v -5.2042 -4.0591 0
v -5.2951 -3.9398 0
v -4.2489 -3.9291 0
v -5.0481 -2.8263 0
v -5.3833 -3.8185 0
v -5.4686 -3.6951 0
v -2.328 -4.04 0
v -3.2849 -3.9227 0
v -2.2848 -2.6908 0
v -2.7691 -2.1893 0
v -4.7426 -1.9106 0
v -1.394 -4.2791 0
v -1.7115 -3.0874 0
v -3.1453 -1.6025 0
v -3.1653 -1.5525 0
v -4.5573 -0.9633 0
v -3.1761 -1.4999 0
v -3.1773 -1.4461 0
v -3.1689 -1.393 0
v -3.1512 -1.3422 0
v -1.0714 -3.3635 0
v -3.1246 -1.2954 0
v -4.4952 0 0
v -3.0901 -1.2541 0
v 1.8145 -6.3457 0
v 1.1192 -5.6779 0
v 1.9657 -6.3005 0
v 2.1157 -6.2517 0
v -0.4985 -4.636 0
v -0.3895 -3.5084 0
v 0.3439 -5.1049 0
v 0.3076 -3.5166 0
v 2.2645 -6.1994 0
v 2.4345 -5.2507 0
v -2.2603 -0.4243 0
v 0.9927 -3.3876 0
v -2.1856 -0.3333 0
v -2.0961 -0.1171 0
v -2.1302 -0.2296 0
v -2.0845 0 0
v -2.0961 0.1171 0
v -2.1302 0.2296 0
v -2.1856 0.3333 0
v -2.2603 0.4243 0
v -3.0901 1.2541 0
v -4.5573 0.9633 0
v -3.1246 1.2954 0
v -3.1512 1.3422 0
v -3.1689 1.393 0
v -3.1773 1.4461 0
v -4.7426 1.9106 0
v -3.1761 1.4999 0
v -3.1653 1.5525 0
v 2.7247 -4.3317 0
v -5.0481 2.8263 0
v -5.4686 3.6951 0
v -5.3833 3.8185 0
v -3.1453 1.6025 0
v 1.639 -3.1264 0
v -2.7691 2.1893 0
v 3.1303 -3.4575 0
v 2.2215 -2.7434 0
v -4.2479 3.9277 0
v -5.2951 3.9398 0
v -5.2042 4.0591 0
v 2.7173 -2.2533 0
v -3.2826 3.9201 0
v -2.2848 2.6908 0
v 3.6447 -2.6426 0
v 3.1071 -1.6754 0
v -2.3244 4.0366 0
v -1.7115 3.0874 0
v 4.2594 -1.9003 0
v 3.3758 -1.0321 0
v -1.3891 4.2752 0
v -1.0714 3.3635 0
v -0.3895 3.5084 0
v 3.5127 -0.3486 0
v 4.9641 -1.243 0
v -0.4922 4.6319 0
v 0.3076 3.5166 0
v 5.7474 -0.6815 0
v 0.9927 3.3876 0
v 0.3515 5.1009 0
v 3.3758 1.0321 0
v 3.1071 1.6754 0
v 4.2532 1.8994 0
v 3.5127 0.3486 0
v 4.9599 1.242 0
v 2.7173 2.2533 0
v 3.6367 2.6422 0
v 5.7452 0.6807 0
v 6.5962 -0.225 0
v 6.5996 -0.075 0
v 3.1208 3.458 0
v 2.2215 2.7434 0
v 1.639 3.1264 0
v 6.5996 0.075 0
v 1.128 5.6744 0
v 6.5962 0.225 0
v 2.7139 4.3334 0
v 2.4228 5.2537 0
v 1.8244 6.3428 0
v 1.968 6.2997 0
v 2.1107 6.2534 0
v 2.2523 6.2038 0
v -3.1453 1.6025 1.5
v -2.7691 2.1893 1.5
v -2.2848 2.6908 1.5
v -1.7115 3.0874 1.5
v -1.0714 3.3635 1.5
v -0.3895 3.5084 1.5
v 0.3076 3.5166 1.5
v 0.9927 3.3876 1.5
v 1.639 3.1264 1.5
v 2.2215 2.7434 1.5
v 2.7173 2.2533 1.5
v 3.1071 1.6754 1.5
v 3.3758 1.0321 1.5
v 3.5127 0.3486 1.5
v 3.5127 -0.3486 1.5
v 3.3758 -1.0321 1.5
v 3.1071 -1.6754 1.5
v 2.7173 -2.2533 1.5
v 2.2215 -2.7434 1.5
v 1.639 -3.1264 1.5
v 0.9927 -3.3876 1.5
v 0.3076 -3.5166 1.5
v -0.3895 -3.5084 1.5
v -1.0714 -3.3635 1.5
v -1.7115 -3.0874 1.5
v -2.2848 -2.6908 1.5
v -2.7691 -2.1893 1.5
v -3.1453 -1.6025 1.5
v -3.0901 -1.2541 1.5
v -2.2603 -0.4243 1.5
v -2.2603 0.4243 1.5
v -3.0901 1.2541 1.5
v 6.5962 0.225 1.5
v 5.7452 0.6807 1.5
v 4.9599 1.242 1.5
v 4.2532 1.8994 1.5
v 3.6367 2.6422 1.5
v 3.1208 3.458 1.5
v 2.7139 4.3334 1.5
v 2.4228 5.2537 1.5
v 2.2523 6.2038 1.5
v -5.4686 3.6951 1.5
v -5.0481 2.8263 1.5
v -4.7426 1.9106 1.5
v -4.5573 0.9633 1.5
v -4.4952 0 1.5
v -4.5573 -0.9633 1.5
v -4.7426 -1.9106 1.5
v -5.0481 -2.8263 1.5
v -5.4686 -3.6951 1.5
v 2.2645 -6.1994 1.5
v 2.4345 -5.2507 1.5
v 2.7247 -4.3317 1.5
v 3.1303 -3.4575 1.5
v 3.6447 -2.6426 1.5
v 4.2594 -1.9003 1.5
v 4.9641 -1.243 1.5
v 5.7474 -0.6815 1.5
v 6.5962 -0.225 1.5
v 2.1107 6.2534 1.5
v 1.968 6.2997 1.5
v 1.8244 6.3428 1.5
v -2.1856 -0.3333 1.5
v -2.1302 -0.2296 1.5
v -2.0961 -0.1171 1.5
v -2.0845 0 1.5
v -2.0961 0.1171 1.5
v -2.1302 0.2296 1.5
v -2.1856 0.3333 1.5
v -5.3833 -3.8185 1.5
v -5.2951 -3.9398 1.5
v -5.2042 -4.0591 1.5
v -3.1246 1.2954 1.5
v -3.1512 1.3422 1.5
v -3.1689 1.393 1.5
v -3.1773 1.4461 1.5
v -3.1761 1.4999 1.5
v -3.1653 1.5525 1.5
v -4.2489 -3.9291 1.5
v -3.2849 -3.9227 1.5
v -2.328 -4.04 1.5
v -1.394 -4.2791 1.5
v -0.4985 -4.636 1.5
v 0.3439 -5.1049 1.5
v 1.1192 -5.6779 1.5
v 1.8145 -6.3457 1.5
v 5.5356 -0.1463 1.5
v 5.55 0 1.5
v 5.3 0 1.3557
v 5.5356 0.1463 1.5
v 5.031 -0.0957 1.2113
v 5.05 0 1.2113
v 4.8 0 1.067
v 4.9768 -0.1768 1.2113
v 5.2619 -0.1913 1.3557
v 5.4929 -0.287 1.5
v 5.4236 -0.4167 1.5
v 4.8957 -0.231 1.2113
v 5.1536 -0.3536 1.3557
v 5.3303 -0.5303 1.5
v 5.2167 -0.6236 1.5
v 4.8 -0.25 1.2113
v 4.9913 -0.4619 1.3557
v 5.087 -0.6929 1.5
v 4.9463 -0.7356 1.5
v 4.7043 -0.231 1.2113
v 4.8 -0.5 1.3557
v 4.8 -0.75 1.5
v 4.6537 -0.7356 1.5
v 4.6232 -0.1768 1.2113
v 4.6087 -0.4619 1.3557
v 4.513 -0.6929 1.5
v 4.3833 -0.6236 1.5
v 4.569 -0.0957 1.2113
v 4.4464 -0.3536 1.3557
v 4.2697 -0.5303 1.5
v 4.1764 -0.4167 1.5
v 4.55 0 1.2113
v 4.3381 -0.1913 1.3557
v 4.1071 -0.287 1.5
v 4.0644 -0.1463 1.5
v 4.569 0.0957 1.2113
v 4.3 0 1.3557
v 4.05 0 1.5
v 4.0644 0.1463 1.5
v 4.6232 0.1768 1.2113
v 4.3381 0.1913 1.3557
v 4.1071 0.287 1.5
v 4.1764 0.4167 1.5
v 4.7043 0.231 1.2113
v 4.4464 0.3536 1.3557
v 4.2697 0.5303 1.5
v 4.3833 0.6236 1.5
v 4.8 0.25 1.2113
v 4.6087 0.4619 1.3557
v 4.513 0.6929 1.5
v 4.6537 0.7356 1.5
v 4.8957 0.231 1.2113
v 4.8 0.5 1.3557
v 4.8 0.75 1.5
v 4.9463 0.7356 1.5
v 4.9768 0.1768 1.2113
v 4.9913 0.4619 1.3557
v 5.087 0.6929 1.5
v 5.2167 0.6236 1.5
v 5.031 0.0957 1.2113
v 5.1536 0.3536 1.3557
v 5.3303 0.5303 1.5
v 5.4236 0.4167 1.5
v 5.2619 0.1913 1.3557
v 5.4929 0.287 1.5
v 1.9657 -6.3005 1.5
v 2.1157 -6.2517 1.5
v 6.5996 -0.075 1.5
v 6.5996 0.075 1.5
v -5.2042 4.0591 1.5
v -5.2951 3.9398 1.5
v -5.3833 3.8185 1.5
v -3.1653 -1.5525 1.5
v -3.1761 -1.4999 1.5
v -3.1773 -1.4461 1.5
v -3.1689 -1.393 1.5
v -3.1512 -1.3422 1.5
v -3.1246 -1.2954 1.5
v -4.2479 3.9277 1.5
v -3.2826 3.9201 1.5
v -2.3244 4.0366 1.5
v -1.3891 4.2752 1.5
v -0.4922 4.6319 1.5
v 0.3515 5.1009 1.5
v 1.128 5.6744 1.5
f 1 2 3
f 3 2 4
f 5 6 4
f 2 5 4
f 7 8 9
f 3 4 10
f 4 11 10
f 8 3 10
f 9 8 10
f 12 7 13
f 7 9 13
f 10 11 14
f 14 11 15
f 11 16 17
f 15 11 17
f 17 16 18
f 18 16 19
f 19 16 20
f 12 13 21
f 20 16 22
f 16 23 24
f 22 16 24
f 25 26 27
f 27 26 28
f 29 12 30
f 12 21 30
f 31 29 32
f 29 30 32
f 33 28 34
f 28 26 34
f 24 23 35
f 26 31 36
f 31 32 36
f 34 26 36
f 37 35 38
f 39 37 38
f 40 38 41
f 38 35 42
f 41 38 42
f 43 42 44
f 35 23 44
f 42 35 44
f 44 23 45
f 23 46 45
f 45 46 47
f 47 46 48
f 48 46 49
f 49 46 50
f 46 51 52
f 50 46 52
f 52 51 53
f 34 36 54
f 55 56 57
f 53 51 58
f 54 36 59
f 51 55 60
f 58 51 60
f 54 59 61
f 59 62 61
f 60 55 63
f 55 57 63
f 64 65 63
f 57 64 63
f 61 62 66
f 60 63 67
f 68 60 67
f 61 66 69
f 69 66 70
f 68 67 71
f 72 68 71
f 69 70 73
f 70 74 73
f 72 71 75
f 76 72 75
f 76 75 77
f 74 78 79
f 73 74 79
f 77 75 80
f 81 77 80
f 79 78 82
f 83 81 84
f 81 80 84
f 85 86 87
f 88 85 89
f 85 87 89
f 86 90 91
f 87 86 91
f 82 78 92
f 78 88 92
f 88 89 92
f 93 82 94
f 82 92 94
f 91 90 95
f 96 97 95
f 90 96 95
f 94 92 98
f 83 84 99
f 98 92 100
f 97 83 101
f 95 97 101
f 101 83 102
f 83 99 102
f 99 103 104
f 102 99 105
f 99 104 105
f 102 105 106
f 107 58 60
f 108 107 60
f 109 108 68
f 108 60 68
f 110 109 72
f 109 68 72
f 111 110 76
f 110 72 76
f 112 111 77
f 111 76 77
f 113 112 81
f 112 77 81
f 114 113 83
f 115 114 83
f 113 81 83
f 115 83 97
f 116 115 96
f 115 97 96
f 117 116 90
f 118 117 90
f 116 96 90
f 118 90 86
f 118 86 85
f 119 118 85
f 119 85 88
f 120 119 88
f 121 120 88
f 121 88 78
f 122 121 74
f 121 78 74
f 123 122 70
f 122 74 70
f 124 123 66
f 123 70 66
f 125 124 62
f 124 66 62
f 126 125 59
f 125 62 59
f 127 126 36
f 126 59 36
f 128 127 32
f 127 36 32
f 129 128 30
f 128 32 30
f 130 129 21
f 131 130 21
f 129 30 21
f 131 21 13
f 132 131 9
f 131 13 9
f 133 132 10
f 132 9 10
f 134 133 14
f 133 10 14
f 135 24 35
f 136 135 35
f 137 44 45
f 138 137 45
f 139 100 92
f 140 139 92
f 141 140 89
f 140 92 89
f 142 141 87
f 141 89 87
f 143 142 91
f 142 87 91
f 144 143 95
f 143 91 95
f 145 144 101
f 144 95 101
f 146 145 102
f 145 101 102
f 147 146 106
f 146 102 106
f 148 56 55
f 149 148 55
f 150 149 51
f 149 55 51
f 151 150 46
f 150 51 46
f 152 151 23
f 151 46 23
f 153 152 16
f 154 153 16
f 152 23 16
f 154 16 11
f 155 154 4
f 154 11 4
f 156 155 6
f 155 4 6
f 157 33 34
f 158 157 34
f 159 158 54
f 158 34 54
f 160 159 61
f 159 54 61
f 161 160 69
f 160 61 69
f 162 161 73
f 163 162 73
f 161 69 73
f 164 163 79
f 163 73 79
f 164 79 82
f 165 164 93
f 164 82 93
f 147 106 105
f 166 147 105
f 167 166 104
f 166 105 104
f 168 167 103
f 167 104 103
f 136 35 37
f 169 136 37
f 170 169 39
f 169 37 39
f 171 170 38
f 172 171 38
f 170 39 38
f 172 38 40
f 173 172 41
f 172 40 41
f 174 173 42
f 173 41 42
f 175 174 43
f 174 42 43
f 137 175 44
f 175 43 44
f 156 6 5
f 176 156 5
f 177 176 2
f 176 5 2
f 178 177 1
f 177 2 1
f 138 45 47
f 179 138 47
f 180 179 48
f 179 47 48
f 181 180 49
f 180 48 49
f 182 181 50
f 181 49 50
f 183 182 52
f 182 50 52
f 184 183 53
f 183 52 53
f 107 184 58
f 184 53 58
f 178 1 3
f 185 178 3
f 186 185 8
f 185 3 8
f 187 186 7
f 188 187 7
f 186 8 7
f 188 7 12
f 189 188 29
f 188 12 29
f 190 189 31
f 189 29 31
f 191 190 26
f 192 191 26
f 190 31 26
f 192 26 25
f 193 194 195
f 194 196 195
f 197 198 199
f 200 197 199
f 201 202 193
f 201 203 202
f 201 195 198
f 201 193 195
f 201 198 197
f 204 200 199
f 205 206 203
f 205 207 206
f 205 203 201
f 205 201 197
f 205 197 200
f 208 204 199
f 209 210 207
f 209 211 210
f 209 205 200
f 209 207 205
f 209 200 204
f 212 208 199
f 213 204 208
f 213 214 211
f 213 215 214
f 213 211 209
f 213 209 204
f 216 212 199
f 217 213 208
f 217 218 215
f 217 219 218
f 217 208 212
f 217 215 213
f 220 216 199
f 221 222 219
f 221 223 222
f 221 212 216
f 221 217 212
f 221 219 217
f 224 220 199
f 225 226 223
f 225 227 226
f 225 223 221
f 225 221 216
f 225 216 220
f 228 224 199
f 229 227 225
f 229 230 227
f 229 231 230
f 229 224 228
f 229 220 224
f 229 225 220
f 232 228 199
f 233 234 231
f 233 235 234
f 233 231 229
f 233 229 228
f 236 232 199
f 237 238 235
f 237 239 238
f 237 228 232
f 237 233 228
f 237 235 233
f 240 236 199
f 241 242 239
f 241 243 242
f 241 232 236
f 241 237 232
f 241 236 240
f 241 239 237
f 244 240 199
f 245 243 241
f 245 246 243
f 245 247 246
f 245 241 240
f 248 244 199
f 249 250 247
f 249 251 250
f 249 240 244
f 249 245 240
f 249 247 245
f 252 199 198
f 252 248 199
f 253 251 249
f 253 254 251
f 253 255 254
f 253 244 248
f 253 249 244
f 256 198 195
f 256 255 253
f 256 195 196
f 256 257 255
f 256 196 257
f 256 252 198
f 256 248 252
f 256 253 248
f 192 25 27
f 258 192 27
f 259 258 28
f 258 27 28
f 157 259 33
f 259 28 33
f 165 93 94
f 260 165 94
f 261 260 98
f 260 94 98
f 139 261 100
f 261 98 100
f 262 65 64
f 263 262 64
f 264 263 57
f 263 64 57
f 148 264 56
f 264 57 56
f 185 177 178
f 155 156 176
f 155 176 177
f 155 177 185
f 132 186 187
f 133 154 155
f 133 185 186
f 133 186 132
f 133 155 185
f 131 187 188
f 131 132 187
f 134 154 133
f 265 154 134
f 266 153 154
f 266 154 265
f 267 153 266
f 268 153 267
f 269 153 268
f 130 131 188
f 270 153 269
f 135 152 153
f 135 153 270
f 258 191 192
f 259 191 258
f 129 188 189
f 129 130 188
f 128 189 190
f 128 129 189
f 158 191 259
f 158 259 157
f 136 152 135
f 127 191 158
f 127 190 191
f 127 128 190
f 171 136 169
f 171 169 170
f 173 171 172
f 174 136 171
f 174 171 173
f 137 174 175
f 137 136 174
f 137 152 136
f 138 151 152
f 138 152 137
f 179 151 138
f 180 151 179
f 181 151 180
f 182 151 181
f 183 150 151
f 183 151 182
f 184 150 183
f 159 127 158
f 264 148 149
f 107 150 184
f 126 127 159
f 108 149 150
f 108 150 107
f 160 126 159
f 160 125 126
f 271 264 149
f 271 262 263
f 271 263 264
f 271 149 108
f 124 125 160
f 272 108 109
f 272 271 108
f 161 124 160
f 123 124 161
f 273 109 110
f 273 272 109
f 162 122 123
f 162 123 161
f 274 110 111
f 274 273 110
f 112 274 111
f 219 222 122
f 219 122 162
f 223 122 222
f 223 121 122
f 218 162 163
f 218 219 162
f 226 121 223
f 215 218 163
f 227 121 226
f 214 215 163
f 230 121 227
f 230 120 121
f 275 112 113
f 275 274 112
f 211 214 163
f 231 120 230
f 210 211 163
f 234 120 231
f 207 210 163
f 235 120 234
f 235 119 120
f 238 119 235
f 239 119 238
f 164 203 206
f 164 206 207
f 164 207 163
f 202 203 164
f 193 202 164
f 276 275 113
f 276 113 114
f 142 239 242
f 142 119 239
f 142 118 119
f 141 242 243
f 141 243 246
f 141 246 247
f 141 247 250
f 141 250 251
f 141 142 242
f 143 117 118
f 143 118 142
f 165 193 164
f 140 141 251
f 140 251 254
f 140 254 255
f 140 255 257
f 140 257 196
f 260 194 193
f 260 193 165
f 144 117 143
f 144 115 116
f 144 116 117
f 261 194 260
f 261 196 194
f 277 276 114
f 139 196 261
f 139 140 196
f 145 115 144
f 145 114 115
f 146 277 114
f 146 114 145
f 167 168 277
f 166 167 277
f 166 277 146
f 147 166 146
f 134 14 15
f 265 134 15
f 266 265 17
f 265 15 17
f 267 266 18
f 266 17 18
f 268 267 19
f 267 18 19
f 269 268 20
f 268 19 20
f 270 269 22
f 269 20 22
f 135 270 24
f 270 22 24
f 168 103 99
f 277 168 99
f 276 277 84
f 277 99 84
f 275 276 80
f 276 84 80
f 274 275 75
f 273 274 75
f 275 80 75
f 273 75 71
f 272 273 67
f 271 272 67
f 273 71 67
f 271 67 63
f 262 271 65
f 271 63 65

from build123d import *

# Parameters (mm, degrees)
F1_DEPTH = 0.5
F4_SCALE = 3


with BuildPart() as f1:
    # F0 (on Top) → F1 (new body)
    with BuildSketch(Plane.XY):
        with BuildLine():
            ThreePointArc((0.6081234737, 2.1142814502), (-0.4630317257, 1.4250651194), (-1.7347256805, 1.3530436147))
            ThreePointArc((-1.7347256805, 1.3530436147), (-1.7798374262, 1.2931275831), (-1.8228806624, 1.2317086913))
            ThreePointArc((-1.8228806624, 1.2317086913), (-1.4984021401, 0), (-1.8228806624, -1.2317086913))
            ThreePointArc((-1.8228806624, -1.2317086913), (-1.7798374262, -1.2931275831), (-1.7347256805, -1.3530436147))
            ThreePointArc((-1.7347256805, -1.3530436147), (-0.4646832841, -1.4263763437), (0.6048373994, -2.1152238487))
            ThreePointArc((0.6048373994, -2.1152238487), (0.6802746399, -2.0921822636), (0.7548374053, -2.0664512337))
            ThreePointArc((0.7548374053, -2.0664512337), (1.2149085882, -0.8808585803), (2.1987212669, -0.075000003))
            ThreePointArc((2.1987212669, -0.075000003), (2.2000000477, 0), (2.1987212669, 0.075000003))
            ThreePointArc((2.1987212669, 0.075000003), (1.2122351514, 0.8807449808), (0.7507612307, 2.0679356335))
            ThreePointArc((0.7507612307, 2.0679356335), (0.6798374024, 2.0923243812), (0.6081234737, 2.1142814502))
        make_face()
        with BuildLine():
            ThreePointArc((-1.0484390882, 0.5341534637), (1.1766666667, 0), (-1.0484390882, -0.5341534637))
            ThreePointArc((-1.0484390882, -0.5341534637), (-1.0581051368, -0.4731125583), (-1.0300472939, -0.4180473054))
            Line((-1.0300472939, -0.4180473054), (-0.7534213469, -0.1414213583))
            ThreePointArc((-0.7534213469, -0.1414213583), (-0.6948427023, 0), (-0.7534213469, 0.1414213583))
            Line((-0.7534213469, 0.1414213583), (-1.0300472939, 0.4180473054))
            ThreePointArc((-1.0300472939, 0.4180473054), (-1.0581051368, 0.4731125583), (-1.0484390882, 0.5341534637))
        make_face(mode=Mode.SUBTRACT)
    extrude(amount=F1_DEPTH)

    # F2 (on Front) → F3 (revolve, cut)
    with BuildSketch(Plane.XZ):
        Polygon((1.85, 0.5), (1.6, 0.5), (1.6, 0.3556624327), align=None)
    revolve(axis=Axis((1.6, 0, 0.4278312164), (0, 0, -1)), mode=Mode.SUBTRACT)


with BuildPart() as f1_1:
    # F4: moved
    add(f1.part.scale(F4_SCALE))


solid = f1_1.part
